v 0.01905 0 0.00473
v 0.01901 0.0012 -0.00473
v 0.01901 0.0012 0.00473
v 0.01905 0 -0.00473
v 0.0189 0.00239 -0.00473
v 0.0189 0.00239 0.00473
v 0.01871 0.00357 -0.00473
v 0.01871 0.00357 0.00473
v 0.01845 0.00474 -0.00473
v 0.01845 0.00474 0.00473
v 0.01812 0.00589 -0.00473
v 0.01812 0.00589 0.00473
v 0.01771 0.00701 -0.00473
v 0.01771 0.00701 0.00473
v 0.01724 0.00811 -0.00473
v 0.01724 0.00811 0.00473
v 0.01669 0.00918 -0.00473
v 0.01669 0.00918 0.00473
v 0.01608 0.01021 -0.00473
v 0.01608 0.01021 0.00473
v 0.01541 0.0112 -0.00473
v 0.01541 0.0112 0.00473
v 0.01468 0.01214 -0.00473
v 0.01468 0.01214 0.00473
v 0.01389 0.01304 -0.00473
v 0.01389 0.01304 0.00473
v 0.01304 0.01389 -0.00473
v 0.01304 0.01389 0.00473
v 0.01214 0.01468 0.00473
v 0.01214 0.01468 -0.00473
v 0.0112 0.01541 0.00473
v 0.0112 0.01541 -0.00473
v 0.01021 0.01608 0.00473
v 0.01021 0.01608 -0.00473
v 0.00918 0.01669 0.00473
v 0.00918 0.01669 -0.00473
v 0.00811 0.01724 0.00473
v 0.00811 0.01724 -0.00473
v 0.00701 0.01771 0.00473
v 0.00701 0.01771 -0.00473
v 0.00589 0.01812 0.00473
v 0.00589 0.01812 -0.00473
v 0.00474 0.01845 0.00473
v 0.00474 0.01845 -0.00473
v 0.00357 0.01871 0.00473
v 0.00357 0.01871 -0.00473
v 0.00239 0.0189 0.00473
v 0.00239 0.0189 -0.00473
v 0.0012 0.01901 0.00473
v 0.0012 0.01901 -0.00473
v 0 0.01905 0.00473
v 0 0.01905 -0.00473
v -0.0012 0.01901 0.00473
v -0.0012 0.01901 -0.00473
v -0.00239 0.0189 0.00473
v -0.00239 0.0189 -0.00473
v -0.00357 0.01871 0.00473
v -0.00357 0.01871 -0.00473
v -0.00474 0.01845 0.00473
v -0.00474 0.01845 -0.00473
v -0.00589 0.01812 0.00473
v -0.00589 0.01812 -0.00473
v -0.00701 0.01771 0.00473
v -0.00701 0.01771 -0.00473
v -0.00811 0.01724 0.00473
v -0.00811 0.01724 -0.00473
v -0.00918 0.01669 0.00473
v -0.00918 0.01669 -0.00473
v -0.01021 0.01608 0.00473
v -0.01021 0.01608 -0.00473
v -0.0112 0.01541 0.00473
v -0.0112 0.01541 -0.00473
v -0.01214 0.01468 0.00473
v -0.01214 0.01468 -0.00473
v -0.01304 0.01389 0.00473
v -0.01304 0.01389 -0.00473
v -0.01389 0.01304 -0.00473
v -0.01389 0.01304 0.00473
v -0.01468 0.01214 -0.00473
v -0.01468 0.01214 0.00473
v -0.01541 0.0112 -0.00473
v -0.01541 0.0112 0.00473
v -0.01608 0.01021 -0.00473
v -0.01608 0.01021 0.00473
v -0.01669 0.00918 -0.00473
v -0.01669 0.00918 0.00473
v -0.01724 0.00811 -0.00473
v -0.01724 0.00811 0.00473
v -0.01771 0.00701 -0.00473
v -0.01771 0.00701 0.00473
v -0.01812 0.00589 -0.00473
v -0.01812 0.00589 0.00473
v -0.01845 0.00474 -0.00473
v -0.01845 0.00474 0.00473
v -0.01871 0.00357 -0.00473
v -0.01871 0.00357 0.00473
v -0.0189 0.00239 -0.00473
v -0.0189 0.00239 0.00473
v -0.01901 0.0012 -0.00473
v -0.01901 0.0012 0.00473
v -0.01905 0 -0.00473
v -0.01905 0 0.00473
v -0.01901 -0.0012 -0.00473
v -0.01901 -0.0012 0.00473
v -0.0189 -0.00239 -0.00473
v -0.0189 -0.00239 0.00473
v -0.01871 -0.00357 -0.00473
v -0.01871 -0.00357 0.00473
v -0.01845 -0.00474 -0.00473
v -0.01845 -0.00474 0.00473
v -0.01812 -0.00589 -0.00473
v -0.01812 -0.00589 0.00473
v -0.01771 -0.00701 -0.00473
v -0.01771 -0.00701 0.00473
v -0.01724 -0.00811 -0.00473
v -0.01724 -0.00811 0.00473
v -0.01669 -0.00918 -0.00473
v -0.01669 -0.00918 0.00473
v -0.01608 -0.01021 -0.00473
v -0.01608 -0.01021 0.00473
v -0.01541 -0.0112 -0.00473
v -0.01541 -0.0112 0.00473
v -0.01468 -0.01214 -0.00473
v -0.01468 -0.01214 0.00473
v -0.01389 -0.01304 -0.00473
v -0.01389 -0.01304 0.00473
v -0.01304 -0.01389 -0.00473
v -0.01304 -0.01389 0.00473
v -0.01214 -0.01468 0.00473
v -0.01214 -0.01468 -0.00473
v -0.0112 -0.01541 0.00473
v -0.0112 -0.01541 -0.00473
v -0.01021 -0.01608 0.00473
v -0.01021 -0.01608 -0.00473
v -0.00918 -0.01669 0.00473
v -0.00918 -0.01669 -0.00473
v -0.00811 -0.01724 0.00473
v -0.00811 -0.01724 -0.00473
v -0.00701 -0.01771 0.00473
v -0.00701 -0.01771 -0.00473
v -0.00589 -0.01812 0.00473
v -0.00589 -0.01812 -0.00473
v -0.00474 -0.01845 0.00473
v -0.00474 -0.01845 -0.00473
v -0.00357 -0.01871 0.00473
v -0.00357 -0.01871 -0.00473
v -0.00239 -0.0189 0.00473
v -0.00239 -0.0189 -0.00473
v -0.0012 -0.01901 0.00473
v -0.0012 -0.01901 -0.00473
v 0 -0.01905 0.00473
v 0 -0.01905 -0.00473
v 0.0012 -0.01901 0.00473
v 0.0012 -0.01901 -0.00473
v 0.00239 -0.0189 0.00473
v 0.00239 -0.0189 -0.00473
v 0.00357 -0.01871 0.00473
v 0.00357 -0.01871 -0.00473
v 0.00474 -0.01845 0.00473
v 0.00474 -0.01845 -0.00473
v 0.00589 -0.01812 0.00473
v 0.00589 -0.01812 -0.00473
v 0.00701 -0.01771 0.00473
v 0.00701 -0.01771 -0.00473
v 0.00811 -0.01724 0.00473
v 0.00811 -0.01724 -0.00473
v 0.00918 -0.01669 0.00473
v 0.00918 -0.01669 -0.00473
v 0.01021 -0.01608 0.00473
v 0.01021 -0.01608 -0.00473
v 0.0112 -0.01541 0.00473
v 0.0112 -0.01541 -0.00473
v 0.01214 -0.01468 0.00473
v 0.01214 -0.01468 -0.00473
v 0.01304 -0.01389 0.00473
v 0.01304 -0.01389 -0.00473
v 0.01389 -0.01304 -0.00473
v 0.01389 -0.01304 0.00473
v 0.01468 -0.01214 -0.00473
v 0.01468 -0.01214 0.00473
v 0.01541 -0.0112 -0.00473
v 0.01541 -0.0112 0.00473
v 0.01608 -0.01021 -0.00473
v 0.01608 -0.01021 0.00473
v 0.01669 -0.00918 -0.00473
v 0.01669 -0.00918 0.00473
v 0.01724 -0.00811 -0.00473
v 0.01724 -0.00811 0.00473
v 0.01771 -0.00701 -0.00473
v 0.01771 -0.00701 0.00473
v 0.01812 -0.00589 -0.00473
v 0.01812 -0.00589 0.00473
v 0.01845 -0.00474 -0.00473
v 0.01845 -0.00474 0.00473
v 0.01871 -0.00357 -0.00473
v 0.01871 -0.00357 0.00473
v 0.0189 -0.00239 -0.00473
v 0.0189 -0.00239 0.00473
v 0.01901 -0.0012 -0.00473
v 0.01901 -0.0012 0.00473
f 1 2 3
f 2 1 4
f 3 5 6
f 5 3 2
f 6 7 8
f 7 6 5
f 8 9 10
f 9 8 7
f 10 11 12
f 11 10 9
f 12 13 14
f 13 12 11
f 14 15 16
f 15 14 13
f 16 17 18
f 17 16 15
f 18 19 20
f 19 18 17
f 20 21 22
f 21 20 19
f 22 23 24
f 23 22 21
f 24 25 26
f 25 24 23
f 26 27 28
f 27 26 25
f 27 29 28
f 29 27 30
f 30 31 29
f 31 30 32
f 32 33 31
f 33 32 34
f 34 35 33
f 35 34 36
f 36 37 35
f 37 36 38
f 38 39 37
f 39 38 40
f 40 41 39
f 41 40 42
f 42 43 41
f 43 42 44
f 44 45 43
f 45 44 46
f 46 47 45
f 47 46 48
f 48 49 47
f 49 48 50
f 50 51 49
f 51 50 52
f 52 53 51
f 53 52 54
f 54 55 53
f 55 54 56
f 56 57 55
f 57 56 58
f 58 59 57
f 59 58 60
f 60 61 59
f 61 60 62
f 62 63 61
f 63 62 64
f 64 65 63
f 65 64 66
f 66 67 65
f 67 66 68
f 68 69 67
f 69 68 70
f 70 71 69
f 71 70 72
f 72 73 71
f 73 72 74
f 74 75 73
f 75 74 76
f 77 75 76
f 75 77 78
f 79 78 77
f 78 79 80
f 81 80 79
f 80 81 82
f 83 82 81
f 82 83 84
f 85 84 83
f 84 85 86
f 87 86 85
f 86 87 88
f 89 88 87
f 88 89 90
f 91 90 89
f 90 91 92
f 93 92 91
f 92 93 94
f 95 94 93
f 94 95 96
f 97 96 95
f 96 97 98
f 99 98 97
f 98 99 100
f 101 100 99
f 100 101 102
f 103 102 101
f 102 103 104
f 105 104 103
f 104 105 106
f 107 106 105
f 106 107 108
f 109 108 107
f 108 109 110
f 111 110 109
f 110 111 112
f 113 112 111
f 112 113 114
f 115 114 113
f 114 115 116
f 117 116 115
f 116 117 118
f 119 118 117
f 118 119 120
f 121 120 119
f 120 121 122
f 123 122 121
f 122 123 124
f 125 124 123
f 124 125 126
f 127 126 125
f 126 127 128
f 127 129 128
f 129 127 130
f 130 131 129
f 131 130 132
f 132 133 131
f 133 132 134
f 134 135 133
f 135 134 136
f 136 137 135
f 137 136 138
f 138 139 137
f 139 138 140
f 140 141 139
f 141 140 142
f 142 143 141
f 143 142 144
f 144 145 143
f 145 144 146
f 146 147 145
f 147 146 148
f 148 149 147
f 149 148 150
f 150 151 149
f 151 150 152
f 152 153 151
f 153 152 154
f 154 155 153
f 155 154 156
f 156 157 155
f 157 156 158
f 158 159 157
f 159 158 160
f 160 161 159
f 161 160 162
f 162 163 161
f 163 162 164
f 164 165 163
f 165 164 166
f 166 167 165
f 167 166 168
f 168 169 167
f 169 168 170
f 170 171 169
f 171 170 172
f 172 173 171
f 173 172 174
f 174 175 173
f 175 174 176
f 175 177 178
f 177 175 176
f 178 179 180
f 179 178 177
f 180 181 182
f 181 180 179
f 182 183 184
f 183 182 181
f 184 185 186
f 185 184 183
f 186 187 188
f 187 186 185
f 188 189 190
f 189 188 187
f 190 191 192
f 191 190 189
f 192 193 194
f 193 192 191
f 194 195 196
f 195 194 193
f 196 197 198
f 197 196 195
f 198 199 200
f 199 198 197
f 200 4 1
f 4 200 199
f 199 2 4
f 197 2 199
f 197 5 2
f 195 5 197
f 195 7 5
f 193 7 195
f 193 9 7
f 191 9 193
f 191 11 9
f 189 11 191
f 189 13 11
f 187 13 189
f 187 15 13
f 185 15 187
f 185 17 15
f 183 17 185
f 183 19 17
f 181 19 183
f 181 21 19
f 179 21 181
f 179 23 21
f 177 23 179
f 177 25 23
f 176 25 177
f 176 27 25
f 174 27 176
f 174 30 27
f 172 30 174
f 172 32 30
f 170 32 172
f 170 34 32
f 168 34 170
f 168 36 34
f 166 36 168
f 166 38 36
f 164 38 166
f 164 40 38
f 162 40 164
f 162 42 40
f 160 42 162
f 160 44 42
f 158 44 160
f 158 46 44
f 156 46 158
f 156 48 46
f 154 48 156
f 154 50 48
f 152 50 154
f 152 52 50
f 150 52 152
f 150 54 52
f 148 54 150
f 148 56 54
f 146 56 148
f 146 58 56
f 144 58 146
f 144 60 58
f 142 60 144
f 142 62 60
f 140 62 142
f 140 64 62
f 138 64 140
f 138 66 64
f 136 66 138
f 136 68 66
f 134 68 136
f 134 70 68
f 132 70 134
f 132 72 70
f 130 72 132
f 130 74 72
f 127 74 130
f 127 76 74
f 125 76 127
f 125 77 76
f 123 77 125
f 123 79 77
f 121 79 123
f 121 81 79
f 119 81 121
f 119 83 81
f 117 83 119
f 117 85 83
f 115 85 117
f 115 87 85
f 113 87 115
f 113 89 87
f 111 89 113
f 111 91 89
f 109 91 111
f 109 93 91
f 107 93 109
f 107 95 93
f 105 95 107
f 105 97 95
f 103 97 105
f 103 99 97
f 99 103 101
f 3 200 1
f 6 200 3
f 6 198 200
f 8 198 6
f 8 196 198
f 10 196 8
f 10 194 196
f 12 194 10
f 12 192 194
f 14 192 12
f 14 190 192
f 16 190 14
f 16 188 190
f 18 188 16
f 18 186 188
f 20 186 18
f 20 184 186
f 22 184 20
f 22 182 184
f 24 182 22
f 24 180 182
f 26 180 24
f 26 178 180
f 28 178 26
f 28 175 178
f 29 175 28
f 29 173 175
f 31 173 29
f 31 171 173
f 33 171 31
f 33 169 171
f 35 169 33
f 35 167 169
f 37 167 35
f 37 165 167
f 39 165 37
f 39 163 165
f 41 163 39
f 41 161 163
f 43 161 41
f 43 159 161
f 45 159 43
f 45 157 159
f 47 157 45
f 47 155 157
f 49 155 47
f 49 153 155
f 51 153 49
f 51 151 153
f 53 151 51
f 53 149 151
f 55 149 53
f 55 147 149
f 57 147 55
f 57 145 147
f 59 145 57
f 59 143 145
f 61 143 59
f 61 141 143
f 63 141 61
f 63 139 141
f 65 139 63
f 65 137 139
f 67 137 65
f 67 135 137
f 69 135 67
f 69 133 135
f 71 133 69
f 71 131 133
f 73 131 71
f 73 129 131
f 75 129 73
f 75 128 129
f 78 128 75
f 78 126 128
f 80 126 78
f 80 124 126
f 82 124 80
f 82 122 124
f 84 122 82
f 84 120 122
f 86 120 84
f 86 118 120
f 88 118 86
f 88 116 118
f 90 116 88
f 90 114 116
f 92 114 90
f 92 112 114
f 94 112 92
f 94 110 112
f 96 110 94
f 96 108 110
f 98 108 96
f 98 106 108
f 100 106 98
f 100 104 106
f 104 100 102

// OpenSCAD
// All units are in meters

include <../openscad2calculix.scad>

// Material properties for acrylic
// Poisson's ratio: https://www.matweb.com/search/DataSheet.aspx?MatGUID=632572aeef2a4224b5ac8fbd4f1b6f77
// Young's modulus: https://www.engineeringtoolbox.com/young-modulus-d_417.html
os2cx_material_elastic_simple(
    "acrylic",
    youngs_modulus=[2.25, "GPa"], /* 1.20 - 3.38 matweb, 1.4 - 3.1 engtoolbox */
    poissons_ratio=0.4, /* 0.37-0.43 */
    density=[1185, "kg/m^3"]); /* 1.185 g/cc */

resolution = 100;
// Stachiw experiments are specified in inches
Di = 1.5;
t = 0.559/Di;
function get_meters_from_inches(inch) = 0.0254 * inch;
Di_meters = get_meters_from_inches(Di);
t_meters = get_meters_from_inches(t);
echo("Di(in)", Di, "t(in)", t, "Di(m)", Di_meters, "t(m)", t_meters, "Di(mm)", Di_meters*1000, "t(mm)", t_meters*1000);
tolerance = 0.001; // 0.001m = 1mm

// Mesh object in OS2CX
os2cx_mesh("test_disc", material="acrylic") {
    cylinder(d=Di_meters, h=t_meters, $fn=resolution, center=true);
}

os2cx_select_volume("supported_edge") {
    difference() {
        cylinder(d=Di_meters+tolerance, h=t_meters-tolerance, $fn=resolution, center=true);
        cylinder(d=Di_meters-tolerance, h=t_meters+tolerance, $fn=resolution, center=true);
    }
}

os2cx_select_surface("load_surface", [0, 0, +1], 45) /* tolerance angle = 45 degrees */ {
    translate([0,0,t_meters/2])
        cylinder(d=Di_meters-tolerance, h=2*tolerance, $fn=resolution, center=true);
}


// Apply pressure across entire load surface in psi
// Convert from psi into Pa since os2cx doesn't support psi or lb/in^2 directly
pressure_psi = 6000;
function get_pascal_from_psi(psi) = 6894.76 * psi;
pressure_Pa = get_pascal_from_psi(pressure_psi);
echo("pressure(psi)", pressure_psi, "pressure(Pa)", pressure_Pa, "pressure(MPa)", pressure_Pa/1000000.0);
os2cx_load_surface(
    "applied_weight",
    "load_surface",
    force_per_area=[[0, 0, -1 * pressure_Pa], "Pa"]);

os2cx_analysis_static_simple(
    fixed="supported_edge",
    load="applied_weight",
    length_unit="m"
);

// Report the maximum deflection of the loaded part
os2cx_measure(
    "max_deflection_result",
    "load_surface",
    "DISP");
